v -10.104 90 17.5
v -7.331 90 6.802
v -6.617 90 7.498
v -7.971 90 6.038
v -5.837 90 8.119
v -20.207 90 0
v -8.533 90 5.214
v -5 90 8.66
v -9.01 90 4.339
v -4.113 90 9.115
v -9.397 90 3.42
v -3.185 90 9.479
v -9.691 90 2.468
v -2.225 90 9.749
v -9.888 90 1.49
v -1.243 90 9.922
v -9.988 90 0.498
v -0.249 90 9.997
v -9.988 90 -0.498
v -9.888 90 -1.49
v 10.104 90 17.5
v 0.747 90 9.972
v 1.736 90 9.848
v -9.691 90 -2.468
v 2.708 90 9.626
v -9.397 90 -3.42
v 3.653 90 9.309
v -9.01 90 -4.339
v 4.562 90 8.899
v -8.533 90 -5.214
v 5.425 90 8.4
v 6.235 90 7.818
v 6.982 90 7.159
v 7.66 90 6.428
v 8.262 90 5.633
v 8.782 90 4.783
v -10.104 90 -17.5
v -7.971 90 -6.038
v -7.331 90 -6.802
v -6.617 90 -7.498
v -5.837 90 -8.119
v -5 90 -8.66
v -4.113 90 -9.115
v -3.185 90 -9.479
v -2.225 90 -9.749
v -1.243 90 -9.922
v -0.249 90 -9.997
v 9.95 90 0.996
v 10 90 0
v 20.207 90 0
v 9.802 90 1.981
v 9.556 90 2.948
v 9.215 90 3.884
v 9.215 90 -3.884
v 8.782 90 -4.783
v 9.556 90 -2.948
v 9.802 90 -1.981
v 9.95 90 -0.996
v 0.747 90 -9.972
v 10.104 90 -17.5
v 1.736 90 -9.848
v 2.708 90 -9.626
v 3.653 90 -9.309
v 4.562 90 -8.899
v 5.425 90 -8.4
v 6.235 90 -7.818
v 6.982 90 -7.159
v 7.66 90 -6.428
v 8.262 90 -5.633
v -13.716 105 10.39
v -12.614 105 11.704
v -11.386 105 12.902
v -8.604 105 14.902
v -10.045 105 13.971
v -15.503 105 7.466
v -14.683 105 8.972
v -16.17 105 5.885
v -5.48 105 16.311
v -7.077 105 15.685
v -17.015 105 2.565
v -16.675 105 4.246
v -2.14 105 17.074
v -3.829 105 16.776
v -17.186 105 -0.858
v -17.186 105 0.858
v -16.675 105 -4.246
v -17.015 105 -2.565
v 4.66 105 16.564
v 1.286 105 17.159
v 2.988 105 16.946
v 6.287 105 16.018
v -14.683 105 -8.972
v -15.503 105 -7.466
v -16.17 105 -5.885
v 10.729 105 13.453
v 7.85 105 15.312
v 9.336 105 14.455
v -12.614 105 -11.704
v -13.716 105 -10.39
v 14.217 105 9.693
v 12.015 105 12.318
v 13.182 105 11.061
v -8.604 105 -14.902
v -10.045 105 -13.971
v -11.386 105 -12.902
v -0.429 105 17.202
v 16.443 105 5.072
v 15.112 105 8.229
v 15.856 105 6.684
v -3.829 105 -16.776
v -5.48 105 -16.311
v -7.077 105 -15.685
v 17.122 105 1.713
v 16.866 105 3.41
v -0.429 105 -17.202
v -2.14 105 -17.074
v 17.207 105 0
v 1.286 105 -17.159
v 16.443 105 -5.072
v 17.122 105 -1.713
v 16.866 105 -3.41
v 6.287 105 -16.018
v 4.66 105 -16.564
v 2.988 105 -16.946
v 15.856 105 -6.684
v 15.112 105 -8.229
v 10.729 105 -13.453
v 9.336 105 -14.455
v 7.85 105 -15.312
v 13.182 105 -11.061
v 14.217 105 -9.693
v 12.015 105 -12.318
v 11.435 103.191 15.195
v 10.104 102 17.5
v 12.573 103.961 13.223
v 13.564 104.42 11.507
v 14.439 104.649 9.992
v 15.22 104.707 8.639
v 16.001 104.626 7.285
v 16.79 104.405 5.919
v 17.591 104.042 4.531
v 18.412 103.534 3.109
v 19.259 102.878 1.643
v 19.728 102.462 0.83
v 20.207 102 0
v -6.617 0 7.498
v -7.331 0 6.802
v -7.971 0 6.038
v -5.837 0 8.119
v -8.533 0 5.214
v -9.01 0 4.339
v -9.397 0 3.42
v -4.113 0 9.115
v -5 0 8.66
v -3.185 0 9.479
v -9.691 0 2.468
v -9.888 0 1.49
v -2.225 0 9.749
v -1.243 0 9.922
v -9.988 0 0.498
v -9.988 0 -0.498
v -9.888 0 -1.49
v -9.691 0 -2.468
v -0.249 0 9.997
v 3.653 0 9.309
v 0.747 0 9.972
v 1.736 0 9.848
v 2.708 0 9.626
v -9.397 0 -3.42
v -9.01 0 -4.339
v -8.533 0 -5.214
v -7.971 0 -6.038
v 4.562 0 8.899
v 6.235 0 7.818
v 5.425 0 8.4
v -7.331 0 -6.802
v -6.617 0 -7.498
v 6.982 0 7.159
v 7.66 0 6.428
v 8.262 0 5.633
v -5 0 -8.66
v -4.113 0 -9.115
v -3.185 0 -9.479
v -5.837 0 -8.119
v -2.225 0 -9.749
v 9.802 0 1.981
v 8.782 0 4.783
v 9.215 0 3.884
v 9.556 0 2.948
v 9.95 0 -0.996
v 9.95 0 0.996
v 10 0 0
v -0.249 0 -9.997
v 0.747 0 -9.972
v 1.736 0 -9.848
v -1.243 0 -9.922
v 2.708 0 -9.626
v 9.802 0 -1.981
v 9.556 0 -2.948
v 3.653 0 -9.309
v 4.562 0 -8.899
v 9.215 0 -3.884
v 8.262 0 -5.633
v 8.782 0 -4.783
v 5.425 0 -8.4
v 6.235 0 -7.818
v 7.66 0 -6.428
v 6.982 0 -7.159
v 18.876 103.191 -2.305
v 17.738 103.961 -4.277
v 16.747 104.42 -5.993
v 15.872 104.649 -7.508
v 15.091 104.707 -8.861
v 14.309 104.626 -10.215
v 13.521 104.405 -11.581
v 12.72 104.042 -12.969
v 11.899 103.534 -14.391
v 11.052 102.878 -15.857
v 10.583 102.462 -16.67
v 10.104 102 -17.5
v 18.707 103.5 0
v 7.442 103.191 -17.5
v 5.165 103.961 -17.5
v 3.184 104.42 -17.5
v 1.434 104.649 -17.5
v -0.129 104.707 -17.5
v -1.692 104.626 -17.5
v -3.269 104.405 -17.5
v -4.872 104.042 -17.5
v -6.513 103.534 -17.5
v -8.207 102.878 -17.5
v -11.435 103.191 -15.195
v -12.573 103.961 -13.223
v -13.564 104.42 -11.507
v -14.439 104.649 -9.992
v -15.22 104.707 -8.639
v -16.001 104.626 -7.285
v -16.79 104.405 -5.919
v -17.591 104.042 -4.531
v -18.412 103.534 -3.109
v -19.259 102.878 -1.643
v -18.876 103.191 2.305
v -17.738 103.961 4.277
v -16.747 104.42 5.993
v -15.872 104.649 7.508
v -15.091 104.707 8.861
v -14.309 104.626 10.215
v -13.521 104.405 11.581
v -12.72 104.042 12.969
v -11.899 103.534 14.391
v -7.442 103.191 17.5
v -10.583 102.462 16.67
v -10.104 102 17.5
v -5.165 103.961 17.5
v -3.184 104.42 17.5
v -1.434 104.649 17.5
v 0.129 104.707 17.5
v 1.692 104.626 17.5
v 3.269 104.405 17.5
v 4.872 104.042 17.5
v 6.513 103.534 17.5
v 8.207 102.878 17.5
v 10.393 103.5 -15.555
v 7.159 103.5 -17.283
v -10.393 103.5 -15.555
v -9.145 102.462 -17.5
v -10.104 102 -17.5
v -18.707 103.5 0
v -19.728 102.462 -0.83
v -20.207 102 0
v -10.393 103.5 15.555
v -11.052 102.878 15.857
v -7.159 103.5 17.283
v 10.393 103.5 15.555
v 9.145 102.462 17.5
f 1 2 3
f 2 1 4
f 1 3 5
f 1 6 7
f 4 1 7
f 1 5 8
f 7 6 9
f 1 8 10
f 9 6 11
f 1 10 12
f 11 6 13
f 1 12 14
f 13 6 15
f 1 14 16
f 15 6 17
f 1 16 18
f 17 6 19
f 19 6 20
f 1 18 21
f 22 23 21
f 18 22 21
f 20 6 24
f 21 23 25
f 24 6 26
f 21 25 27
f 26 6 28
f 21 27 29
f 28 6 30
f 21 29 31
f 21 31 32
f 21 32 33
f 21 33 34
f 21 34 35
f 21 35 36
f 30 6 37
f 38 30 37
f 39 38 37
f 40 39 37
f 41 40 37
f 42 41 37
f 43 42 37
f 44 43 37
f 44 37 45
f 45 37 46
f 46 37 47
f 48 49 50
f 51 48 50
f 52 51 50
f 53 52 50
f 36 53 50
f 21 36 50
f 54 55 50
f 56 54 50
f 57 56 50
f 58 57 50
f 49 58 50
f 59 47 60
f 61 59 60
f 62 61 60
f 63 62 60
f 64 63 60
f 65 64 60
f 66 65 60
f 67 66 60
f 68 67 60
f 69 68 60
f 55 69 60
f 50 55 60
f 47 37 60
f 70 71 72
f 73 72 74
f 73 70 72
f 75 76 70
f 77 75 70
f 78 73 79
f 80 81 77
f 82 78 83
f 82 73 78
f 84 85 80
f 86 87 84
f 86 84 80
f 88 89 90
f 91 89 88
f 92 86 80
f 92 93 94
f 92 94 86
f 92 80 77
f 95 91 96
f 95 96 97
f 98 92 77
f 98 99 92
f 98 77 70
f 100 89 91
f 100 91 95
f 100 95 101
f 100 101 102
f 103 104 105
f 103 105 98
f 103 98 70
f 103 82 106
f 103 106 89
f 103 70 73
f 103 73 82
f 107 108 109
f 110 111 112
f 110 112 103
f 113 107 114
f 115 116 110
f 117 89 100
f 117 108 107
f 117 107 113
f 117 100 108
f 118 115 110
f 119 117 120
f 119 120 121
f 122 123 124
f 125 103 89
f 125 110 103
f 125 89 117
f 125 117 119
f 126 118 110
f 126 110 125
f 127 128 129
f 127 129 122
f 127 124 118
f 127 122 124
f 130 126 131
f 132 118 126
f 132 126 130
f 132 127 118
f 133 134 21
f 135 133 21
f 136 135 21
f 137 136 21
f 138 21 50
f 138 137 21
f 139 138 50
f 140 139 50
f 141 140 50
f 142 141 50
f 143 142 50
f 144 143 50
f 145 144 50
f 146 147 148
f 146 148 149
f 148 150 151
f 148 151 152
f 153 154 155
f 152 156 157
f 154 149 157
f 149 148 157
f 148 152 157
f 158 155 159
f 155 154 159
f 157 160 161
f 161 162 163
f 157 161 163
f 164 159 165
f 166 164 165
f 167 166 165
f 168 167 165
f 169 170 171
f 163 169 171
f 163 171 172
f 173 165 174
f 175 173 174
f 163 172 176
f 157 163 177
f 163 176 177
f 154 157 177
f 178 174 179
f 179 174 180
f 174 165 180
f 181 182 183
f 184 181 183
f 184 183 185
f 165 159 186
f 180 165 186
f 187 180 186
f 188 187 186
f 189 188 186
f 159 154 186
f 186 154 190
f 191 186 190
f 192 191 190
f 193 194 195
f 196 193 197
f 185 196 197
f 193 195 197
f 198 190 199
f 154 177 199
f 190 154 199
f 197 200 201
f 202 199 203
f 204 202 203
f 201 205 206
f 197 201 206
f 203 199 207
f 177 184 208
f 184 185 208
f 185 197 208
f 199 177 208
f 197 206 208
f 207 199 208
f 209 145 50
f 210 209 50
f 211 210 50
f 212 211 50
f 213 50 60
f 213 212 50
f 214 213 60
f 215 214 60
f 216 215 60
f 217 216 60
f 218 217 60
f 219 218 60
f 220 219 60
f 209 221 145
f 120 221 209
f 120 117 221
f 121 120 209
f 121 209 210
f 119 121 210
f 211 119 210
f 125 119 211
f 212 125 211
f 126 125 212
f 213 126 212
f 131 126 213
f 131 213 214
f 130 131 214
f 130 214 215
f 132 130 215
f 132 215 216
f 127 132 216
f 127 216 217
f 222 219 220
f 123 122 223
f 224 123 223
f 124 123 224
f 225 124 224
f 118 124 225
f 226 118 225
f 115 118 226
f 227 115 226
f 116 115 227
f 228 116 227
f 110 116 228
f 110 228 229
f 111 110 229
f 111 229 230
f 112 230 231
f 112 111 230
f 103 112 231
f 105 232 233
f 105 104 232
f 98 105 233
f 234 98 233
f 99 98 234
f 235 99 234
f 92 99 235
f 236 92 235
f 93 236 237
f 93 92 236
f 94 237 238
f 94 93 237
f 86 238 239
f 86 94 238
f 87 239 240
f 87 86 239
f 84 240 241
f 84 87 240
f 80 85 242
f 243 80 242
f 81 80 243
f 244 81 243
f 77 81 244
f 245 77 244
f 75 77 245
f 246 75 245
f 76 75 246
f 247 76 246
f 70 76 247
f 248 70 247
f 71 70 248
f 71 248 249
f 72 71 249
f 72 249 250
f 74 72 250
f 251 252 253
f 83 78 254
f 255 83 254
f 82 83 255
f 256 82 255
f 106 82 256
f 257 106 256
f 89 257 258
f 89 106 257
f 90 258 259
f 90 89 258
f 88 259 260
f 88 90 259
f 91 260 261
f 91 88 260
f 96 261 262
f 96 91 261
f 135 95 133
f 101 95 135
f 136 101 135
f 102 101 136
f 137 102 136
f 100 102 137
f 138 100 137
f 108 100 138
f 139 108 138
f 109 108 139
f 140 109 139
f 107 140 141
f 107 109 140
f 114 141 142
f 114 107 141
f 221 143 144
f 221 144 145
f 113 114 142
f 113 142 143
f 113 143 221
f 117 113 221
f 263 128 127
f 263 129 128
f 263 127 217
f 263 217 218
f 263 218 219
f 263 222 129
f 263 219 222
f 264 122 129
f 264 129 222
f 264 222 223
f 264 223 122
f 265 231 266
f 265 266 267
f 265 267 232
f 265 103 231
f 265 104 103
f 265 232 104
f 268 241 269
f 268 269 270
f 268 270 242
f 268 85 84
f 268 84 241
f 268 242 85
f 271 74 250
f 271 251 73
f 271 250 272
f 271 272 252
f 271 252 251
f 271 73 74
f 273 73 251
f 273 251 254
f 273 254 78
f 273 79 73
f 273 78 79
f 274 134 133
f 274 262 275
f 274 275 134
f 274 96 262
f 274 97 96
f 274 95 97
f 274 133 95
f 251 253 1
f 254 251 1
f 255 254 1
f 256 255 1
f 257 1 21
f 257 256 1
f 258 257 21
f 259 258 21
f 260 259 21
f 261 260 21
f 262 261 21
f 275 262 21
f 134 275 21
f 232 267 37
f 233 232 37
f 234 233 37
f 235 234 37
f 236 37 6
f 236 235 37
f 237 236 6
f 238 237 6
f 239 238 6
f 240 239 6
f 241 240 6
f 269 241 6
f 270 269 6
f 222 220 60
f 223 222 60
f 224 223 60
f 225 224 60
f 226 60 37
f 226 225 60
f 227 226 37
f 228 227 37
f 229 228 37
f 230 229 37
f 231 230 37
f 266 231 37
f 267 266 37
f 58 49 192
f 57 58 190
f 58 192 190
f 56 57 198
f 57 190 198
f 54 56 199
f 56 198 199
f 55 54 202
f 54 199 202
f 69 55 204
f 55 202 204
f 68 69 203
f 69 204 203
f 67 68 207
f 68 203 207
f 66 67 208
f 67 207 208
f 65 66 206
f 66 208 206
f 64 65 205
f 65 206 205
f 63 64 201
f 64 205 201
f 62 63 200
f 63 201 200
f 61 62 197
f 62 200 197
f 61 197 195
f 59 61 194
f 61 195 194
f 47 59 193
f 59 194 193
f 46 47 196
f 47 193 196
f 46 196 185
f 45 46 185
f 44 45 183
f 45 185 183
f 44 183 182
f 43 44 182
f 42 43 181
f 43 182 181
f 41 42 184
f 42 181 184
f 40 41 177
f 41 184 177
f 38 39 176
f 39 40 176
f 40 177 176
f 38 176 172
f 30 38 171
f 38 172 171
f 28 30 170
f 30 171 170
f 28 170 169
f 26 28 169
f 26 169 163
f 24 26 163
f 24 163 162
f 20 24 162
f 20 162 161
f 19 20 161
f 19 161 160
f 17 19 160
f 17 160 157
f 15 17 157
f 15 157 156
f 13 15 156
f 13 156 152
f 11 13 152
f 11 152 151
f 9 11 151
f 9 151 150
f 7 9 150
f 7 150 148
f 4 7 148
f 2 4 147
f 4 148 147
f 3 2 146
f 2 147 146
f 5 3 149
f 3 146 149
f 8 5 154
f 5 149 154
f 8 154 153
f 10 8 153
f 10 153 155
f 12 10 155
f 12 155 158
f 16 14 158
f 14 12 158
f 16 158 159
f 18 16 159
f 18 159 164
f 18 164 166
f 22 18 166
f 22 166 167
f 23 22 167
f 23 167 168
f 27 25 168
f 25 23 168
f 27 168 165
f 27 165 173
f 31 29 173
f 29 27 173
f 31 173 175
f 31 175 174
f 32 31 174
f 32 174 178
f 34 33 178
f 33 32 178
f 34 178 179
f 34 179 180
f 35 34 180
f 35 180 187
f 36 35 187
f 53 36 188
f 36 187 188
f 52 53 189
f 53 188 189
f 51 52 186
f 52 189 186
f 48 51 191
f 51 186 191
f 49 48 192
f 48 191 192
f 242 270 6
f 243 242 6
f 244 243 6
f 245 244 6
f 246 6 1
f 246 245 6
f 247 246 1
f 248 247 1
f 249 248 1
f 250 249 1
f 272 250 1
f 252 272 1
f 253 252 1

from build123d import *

# Parameters (mm, degrees)
SKETCH1_R           = 10
BOSS_EXTRUDE1_DEPTH = 105
BOSS_EXTRUDE2_DEPTH = 15


with BuildPart() as part:
    # Sketch1 → Boss-Extrude1 (new body)
    with BuildSketch(Plane(origin=(0, 0, 0), x_dir=(1, 0, 0), z_dir=(0, 1, 0))):
        Circle(SKETCH1_R)
    extrude(amount=BOSS_EXTRUDE1_DEPTH)

    # Sketch2 → Boss-Extrude2 (add)
    with BuildSketch(Plane(origin=(0, 105, 0), x_dir=(1, 0, 0), z_dir=(0, 1, 0))):
        Polygon((20.207259422, 0), (10.103629711, 17.5), (-10.103629711, 17.5), (-20.207259422, 0), (-10.103629711, -17.5), (10.103629711, -17.5), align=None)
    extrude(amount=-BOSS_EXTRUDE2_DEPTH)

    # Sketch3 → Cut-Revolve1 (revolve, cut)
    with BuildSketch(Plane.XY):
        Polygon((20.207259422, 105), (20.207259422, 102), (17.207259422, 105), align=None)
    revolve(axis=Axis((0, 0, 0), (0, 1, 0)), mode=Mode.SUBTRACT)


solid = part.part
